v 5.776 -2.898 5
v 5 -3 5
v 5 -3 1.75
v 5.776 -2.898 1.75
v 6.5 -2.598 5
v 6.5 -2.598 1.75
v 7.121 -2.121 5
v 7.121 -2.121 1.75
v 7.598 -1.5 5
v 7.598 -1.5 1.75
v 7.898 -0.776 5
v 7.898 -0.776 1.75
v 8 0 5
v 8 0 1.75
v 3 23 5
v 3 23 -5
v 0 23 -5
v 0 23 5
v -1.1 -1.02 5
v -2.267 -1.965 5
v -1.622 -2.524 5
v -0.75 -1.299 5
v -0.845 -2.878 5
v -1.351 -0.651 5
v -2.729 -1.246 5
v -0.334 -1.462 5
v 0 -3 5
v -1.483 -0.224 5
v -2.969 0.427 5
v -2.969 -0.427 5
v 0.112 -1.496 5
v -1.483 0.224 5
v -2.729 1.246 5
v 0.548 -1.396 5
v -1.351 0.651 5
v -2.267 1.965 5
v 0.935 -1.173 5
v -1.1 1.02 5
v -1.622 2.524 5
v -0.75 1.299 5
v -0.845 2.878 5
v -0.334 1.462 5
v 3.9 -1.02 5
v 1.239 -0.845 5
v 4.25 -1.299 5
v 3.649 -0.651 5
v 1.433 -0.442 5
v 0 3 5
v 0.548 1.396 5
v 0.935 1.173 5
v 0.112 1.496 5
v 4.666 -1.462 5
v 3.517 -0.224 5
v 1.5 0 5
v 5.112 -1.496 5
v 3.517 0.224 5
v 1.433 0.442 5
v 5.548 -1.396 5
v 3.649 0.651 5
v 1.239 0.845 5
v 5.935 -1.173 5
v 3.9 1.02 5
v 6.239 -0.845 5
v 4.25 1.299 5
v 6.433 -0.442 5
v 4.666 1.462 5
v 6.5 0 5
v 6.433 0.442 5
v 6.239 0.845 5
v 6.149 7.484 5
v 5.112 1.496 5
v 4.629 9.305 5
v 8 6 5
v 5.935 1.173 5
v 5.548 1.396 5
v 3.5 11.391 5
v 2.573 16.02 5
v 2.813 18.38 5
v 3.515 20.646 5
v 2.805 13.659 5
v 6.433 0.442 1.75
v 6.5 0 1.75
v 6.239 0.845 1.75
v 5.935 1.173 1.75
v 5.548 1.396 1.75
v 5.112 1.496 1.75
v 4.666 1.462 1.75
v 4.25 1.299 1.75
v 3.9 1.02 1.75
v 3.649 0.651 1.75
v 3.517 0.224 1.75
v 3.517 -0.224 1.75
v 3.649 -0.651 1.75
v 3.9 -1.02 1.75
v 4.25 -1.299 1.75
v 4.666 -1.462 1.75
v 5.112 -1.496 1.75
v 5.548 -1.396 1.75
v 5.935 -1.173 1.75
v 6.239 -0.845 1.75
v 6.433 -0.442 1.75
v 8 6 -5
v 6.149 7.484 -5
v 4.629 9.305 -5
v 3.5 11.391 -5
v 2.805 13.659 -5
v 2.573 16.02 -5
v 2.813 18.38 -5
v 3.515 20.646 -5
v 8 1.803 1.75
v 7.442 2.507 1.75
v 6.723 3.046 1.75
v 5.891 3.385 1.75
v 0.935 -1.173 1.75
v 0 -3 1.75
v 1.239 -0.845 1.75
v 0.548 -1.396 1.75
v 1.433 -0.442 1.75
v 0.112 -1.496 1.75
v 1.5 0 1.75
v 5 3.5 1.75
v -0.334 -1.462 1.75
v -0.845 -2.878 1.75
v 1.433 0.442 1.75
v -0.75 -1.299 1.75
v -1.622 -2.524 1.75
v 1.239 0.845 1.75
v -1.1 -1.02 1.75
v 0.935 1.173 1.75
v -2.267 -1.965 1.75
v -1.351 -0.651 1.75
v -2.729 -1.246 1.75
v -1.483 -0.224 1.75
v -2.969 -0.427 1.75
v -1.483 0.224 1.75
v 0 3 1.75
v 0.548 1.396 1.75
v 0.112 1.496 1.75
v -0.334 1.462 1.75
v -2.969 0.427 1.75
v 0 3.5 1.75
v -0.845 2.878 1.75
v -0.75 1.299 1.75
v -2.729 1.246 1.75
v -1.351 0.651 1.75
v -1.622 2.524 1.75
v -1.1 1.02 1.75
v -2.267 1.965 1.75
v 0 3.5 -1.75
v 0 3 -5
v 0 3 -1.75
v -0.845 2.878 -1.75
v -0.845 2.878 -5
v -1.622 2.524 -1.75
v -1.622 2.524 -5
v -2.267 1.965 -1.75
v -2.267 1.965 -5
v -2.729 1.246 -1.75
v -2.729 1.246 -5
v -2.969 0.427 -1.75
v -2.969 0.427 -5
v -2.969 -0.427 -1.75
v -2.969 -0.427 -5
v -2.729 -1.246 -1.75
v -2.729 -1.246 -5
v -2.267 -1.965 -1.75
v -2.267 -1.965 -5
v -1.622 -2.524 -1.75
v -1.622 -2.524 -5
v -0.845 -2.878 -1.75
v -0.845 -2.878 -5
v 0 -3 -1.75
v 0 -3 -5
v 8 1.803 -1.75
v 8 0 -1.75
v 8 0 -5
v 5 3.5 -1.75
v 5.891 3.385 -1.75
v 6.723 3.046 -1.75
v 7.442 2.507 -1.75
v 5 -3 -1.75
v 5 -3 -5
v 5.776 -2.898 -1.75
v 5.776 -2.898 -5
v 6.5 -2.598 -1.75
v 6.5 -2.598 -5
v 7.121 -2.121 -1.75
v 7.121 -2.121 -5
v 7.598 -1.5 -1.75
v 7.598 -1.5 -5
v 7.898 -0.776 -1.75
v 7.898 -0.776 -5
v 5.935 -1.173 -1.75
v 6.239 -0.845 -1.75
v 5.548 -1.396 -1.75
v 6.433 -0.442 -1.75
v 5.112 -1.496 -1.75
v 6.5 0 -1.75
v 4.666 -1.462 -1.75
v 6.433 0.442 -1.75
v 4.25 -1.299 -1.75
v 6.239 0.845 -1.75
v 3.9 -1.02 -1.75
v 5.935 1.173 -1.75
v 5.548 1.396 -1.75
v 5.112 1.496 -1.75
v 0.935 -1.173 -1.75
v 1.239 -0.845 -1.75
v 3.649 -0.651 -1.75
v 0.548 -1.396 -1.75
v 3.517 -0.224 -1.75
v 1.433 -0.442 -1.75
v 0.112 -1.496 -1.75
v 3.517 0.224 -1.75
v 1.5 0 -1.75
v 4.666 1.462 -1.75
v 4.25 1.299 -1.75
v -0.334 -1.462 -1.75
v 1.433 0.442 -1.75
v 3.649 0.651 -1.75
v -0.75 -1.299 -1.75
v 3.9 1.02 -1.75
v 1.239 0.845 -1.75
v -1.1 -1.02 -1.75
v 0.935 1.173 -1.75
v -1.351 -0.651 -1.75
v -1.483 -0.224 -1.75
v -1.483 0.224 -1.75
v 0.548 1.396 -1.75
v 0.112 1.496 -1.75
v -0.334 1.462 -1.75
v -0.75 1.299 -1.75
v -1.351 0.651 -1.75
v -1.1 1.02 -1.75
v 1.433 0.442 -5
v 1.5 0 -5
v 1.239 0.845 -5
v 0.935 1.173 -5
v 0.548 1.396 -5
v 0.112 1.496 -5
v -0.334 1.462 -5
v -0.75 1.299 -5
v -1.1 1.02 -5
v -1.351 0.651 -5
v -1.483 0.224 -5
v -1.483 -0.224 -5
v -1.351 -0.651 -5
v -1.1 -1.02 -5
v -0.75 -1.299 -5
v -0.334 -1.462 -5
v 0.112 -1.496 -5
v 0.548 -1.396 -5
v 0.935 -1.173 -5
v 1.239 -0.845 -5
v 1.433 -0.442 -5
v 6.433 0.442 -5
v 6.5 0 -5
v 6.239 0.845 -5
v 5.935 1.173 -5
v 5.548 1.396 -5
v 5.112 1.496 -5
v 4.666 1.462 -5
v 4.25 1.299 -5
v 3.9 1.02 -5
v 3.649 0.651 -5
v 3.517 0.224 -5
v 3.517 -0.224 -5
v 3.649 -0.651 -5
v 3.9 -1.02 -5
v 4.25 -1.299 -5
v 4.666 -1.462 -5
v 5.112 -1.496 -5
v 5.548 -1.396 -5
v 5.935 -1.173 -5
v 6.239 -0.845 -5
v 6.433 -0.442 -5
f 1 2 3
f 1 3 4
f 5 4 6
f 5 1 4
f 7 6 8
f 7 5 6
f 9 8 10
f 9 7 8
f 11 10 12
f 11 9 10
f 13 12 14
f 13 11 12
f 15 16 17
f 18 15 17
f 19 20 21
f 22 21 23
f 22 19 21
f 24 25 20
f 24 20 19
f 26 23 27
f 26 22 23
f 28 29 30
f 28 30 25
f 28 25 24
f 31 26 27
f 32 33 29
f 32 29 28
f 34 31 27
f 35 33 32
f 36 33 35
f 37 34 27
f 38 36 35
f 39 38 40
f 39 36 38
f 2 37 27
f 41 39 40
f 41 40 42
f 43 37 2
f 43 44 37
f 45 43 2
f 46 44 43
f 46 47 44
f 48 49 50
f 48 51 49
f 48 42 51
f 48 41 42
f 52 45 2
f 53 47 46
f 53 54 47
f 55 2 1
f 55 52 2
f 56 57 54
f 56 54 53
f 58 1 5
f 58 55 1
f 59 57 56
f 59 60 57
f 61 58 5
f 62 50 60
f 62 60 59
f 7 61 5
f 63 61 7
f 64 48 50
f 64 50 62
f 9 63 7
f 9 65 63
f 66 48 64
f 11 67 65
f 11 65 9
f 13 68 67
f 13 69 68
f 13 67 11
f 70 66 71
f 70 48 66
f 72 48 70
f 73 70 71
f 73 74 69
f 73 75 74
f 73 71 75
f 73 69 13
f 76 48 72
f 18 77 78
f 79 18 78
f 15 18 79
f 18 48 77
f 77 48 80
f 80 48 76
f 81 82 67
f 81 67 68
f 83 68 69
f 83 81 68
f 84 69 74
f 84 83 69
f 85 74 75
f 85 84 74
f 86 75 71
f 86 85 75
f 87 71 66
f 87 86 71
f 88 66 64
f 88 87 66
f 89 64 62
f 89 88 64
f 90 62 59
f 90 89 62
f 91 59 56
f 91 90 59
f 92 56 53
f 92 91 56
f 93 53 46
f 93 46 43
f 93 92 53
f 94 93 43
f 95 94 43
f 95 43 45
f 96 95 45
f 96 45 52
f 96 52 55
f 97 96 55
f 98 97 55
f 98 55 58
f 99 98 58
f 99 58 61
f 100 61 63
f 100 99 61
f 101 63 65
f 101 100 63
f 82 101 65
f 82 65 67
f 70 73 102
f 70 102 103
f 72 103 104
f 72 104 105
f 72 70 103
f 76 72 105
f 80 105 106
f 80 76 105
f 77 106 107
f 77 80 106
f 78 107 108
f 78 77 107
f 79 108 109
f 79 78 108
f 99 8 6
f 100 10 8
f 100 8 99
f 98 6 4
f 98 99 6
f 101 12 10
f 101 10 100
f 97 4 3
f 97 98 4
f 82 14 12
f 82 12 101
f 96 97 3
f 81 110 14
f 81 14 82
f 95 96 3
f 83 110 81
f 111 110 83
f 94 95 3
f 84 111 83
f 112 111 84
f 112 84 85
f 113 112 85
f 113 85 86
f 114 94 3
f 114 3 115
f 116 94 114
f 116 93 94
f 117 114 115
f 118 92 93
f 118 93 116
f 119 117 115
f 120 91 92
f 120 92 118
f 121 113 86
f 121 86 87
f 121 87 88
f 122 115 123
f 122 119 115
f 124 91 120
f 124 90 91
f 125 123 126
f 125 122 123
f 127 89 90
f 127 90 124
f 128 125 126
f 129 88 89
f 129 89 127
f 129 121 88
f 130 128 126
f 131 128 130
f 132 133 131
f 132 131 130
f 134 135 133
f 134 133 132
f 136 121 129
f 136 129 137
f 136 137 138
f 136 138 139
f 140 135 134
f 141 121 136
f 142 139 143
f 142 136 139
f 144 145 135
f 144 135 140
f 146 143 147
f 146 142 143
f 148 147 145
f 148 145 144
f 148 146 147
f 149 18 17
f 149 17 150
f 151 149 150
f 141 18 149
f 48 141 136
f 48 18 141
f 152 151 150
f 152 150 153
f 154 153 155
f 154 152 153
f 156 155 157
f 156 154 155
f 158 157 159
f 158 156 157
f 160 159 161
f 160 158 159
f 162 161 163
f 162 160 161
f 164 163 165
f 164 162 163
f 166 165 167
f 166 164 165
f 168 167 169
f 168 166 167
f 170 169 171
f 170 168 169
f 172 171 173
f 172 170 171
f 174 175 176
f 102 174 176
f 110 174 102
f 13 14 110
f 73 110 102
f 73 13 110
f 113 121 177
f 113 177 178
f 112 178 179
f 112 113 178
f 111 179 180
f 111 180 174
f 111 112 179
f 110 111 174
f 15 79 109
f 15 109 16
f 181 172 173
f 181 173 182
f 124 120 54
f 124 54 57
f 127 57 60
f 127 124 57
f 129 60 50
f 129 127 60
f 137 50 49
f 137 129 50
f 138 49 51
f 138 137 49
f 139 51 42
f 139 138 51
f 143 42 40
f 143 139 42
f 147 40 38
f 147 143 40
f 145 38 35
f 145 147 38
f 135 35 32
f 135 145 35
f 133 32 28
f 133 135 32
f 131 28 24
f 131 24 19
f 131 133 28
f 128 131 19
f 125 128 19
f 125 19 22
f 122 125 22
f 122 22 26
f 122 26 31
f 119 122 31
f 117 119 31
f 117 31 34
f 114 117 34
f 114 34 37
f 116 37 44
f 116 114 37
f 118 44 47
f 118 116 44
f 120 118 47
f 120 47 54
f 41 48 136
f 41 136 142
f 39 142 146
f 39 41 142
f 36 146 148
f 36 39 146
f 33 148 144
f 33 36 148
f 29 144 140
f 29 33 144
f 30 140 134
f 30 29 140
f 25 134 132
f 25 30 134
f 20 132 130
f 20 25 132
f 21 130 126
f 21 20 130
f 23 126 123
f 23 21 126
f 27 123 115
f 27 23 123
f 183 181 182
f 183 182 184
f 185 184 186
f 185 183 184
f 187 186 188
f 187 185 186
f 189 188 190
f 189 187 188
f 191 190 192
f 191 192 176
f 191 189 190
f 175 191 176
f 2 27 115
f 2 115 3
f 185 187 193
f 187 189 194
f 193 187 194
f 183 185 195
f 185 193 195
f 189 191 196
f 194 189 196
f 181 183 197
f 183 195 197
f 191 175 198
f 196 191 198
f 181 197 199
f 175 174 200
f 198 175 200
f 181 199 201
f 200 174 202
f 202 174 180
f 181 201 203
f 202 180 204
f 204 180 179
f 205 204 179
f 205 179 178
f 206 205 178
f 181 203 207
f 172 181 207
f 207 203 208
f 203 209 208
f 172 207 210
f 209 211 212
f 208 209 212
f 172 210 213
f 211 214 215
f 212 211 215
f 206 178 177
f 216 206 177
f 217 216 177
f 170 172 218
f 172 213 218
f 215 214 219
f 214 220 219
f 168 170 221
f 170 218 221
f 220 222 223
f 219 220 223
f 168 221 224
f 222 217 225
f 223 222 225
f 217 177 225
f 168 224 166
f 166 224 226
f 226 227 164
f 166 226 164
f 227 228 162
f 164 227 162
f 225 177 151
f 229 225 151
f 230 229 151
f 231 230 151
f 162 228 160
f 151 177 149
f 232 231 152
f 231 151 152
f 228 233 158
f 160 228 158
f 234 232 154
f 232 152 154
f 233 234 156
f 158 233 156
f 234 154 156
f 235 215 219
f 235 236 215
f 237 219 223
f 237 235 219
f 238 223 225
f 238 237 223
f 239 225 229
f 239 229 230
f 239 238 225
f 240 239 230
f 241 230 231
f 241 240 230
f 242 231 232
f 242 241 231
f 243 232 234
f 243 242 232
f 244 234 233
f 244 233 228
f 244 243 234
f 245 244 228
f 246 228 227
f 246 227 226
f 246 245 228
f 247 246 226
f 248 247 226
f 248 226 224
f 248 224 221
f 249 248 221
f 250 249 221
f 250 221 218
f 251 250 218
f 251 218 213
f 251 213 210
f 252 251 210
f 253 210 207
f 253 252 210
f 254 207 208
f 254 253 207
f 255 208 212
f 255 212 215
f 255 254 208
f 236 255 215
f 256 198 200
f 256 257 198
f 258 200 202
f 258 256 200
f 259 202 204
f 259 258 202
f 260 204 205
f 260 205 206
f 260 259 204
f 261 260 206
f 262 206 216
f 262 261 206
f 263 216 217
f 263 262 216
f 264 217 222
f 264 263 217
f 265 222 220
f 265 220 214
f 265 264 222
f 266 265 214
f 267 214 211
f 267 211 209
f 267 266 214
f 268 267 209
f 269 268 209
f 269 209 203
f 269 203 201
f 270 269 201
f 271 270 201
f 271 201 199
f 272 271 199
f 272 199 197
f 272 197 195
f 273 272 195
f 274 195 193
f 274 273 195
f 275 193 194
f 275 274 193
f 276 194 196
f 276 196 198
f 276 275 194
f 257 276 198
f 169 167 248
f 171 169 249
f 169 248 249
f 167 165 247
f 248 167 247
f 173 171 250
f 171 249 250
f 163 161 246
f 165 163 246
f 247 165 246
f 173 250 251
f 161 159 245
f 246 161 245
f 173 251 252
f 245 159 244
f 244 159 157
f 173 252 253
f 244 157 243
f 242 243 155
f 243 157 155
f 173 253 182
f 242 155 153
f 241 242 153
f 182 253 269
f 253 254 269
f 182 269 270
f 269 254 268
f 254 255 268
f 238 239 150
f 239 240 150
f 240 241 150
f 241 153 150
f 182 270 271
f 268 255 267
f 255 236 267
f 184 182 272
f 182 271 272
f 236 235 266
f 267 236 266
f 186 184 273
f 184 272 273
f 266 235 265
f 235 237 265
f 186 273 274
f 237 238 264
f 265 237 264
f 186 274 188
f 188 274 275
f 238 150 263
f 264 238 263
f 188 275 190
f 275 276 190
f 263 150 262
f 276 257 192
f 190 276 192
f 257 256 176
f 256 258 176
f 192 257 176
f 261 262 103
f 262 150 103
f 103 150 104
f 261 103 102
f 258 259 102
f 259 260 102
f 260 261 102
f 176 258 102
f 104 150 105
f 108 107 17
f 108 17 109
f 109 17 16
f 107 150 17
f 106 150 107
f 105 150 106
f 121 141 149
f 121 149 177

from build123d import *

# Parameters (mm, degrees)
SKETCH1_R           = 1.5
BOSS_EXTRUDE1_DEPTH = 5
SKETCH2_R           = 1.5
CUT_EXTRUDE1_DEPTH  = 1.75


with BuildPart() as part:
    # Sketch1 → Boss-Extrude1 (new, symmetric)
    with BuildSketch(Plane.XY):
        with BuildLine():
            Line((0, -3), (5, -3))
            ThreePointArc((5, -3), (7.121320344, -2.121320344), (8, 0))
            Line((8, 0), (8, 6))
            ThreePointArc((8, 6), (3.095785062, 12.50802611), (3.515332481, 20.646189784))
            Line((3.515332481, 20.646189784), (3, 23))
            Line((3, 23), (0, 23))
            Line((0, 23), (0, 3))
            ThreePointArc((0, 3), (-3, 0), (0, -3))
        make_face()
        Circle(SKETCH1_R, mode=Mode.SUBTRACT)
        with Locations((5, 0)):
            Circle(SKETCH1_R, mode=Mode.SUBTRACT)
    extrude(amount=BOSS_EXTRUDE1_DEPTH, both=True)

    # Sketch2 → Cut-Extrude1 (cut, symmetric)
    with BuildSketch(Plane.XY):
        with BuildLine():
            Line((0, 3.5), (5, 3.5))
            ThreePointArc((5, 3.5), (8.5, 0), (5, -3.5))
            Line((5, -3.5), (0, -3.5))
            ThreePointArc((0, -3.5), (-3.5, 0), (0, 3.5))
        make_face()
        Circle(SKETCH2_R, mode=Mode.SUBTRACT)
        with Locations((5, 0)):
            Circle(SKETCH2_R, mode=Mode.SUBTRACT)
    extrude(amount=CUT_EXTRUDE1_DEPTH, both=True, mode=Mode.SUBTRACT)


solid = part.part
